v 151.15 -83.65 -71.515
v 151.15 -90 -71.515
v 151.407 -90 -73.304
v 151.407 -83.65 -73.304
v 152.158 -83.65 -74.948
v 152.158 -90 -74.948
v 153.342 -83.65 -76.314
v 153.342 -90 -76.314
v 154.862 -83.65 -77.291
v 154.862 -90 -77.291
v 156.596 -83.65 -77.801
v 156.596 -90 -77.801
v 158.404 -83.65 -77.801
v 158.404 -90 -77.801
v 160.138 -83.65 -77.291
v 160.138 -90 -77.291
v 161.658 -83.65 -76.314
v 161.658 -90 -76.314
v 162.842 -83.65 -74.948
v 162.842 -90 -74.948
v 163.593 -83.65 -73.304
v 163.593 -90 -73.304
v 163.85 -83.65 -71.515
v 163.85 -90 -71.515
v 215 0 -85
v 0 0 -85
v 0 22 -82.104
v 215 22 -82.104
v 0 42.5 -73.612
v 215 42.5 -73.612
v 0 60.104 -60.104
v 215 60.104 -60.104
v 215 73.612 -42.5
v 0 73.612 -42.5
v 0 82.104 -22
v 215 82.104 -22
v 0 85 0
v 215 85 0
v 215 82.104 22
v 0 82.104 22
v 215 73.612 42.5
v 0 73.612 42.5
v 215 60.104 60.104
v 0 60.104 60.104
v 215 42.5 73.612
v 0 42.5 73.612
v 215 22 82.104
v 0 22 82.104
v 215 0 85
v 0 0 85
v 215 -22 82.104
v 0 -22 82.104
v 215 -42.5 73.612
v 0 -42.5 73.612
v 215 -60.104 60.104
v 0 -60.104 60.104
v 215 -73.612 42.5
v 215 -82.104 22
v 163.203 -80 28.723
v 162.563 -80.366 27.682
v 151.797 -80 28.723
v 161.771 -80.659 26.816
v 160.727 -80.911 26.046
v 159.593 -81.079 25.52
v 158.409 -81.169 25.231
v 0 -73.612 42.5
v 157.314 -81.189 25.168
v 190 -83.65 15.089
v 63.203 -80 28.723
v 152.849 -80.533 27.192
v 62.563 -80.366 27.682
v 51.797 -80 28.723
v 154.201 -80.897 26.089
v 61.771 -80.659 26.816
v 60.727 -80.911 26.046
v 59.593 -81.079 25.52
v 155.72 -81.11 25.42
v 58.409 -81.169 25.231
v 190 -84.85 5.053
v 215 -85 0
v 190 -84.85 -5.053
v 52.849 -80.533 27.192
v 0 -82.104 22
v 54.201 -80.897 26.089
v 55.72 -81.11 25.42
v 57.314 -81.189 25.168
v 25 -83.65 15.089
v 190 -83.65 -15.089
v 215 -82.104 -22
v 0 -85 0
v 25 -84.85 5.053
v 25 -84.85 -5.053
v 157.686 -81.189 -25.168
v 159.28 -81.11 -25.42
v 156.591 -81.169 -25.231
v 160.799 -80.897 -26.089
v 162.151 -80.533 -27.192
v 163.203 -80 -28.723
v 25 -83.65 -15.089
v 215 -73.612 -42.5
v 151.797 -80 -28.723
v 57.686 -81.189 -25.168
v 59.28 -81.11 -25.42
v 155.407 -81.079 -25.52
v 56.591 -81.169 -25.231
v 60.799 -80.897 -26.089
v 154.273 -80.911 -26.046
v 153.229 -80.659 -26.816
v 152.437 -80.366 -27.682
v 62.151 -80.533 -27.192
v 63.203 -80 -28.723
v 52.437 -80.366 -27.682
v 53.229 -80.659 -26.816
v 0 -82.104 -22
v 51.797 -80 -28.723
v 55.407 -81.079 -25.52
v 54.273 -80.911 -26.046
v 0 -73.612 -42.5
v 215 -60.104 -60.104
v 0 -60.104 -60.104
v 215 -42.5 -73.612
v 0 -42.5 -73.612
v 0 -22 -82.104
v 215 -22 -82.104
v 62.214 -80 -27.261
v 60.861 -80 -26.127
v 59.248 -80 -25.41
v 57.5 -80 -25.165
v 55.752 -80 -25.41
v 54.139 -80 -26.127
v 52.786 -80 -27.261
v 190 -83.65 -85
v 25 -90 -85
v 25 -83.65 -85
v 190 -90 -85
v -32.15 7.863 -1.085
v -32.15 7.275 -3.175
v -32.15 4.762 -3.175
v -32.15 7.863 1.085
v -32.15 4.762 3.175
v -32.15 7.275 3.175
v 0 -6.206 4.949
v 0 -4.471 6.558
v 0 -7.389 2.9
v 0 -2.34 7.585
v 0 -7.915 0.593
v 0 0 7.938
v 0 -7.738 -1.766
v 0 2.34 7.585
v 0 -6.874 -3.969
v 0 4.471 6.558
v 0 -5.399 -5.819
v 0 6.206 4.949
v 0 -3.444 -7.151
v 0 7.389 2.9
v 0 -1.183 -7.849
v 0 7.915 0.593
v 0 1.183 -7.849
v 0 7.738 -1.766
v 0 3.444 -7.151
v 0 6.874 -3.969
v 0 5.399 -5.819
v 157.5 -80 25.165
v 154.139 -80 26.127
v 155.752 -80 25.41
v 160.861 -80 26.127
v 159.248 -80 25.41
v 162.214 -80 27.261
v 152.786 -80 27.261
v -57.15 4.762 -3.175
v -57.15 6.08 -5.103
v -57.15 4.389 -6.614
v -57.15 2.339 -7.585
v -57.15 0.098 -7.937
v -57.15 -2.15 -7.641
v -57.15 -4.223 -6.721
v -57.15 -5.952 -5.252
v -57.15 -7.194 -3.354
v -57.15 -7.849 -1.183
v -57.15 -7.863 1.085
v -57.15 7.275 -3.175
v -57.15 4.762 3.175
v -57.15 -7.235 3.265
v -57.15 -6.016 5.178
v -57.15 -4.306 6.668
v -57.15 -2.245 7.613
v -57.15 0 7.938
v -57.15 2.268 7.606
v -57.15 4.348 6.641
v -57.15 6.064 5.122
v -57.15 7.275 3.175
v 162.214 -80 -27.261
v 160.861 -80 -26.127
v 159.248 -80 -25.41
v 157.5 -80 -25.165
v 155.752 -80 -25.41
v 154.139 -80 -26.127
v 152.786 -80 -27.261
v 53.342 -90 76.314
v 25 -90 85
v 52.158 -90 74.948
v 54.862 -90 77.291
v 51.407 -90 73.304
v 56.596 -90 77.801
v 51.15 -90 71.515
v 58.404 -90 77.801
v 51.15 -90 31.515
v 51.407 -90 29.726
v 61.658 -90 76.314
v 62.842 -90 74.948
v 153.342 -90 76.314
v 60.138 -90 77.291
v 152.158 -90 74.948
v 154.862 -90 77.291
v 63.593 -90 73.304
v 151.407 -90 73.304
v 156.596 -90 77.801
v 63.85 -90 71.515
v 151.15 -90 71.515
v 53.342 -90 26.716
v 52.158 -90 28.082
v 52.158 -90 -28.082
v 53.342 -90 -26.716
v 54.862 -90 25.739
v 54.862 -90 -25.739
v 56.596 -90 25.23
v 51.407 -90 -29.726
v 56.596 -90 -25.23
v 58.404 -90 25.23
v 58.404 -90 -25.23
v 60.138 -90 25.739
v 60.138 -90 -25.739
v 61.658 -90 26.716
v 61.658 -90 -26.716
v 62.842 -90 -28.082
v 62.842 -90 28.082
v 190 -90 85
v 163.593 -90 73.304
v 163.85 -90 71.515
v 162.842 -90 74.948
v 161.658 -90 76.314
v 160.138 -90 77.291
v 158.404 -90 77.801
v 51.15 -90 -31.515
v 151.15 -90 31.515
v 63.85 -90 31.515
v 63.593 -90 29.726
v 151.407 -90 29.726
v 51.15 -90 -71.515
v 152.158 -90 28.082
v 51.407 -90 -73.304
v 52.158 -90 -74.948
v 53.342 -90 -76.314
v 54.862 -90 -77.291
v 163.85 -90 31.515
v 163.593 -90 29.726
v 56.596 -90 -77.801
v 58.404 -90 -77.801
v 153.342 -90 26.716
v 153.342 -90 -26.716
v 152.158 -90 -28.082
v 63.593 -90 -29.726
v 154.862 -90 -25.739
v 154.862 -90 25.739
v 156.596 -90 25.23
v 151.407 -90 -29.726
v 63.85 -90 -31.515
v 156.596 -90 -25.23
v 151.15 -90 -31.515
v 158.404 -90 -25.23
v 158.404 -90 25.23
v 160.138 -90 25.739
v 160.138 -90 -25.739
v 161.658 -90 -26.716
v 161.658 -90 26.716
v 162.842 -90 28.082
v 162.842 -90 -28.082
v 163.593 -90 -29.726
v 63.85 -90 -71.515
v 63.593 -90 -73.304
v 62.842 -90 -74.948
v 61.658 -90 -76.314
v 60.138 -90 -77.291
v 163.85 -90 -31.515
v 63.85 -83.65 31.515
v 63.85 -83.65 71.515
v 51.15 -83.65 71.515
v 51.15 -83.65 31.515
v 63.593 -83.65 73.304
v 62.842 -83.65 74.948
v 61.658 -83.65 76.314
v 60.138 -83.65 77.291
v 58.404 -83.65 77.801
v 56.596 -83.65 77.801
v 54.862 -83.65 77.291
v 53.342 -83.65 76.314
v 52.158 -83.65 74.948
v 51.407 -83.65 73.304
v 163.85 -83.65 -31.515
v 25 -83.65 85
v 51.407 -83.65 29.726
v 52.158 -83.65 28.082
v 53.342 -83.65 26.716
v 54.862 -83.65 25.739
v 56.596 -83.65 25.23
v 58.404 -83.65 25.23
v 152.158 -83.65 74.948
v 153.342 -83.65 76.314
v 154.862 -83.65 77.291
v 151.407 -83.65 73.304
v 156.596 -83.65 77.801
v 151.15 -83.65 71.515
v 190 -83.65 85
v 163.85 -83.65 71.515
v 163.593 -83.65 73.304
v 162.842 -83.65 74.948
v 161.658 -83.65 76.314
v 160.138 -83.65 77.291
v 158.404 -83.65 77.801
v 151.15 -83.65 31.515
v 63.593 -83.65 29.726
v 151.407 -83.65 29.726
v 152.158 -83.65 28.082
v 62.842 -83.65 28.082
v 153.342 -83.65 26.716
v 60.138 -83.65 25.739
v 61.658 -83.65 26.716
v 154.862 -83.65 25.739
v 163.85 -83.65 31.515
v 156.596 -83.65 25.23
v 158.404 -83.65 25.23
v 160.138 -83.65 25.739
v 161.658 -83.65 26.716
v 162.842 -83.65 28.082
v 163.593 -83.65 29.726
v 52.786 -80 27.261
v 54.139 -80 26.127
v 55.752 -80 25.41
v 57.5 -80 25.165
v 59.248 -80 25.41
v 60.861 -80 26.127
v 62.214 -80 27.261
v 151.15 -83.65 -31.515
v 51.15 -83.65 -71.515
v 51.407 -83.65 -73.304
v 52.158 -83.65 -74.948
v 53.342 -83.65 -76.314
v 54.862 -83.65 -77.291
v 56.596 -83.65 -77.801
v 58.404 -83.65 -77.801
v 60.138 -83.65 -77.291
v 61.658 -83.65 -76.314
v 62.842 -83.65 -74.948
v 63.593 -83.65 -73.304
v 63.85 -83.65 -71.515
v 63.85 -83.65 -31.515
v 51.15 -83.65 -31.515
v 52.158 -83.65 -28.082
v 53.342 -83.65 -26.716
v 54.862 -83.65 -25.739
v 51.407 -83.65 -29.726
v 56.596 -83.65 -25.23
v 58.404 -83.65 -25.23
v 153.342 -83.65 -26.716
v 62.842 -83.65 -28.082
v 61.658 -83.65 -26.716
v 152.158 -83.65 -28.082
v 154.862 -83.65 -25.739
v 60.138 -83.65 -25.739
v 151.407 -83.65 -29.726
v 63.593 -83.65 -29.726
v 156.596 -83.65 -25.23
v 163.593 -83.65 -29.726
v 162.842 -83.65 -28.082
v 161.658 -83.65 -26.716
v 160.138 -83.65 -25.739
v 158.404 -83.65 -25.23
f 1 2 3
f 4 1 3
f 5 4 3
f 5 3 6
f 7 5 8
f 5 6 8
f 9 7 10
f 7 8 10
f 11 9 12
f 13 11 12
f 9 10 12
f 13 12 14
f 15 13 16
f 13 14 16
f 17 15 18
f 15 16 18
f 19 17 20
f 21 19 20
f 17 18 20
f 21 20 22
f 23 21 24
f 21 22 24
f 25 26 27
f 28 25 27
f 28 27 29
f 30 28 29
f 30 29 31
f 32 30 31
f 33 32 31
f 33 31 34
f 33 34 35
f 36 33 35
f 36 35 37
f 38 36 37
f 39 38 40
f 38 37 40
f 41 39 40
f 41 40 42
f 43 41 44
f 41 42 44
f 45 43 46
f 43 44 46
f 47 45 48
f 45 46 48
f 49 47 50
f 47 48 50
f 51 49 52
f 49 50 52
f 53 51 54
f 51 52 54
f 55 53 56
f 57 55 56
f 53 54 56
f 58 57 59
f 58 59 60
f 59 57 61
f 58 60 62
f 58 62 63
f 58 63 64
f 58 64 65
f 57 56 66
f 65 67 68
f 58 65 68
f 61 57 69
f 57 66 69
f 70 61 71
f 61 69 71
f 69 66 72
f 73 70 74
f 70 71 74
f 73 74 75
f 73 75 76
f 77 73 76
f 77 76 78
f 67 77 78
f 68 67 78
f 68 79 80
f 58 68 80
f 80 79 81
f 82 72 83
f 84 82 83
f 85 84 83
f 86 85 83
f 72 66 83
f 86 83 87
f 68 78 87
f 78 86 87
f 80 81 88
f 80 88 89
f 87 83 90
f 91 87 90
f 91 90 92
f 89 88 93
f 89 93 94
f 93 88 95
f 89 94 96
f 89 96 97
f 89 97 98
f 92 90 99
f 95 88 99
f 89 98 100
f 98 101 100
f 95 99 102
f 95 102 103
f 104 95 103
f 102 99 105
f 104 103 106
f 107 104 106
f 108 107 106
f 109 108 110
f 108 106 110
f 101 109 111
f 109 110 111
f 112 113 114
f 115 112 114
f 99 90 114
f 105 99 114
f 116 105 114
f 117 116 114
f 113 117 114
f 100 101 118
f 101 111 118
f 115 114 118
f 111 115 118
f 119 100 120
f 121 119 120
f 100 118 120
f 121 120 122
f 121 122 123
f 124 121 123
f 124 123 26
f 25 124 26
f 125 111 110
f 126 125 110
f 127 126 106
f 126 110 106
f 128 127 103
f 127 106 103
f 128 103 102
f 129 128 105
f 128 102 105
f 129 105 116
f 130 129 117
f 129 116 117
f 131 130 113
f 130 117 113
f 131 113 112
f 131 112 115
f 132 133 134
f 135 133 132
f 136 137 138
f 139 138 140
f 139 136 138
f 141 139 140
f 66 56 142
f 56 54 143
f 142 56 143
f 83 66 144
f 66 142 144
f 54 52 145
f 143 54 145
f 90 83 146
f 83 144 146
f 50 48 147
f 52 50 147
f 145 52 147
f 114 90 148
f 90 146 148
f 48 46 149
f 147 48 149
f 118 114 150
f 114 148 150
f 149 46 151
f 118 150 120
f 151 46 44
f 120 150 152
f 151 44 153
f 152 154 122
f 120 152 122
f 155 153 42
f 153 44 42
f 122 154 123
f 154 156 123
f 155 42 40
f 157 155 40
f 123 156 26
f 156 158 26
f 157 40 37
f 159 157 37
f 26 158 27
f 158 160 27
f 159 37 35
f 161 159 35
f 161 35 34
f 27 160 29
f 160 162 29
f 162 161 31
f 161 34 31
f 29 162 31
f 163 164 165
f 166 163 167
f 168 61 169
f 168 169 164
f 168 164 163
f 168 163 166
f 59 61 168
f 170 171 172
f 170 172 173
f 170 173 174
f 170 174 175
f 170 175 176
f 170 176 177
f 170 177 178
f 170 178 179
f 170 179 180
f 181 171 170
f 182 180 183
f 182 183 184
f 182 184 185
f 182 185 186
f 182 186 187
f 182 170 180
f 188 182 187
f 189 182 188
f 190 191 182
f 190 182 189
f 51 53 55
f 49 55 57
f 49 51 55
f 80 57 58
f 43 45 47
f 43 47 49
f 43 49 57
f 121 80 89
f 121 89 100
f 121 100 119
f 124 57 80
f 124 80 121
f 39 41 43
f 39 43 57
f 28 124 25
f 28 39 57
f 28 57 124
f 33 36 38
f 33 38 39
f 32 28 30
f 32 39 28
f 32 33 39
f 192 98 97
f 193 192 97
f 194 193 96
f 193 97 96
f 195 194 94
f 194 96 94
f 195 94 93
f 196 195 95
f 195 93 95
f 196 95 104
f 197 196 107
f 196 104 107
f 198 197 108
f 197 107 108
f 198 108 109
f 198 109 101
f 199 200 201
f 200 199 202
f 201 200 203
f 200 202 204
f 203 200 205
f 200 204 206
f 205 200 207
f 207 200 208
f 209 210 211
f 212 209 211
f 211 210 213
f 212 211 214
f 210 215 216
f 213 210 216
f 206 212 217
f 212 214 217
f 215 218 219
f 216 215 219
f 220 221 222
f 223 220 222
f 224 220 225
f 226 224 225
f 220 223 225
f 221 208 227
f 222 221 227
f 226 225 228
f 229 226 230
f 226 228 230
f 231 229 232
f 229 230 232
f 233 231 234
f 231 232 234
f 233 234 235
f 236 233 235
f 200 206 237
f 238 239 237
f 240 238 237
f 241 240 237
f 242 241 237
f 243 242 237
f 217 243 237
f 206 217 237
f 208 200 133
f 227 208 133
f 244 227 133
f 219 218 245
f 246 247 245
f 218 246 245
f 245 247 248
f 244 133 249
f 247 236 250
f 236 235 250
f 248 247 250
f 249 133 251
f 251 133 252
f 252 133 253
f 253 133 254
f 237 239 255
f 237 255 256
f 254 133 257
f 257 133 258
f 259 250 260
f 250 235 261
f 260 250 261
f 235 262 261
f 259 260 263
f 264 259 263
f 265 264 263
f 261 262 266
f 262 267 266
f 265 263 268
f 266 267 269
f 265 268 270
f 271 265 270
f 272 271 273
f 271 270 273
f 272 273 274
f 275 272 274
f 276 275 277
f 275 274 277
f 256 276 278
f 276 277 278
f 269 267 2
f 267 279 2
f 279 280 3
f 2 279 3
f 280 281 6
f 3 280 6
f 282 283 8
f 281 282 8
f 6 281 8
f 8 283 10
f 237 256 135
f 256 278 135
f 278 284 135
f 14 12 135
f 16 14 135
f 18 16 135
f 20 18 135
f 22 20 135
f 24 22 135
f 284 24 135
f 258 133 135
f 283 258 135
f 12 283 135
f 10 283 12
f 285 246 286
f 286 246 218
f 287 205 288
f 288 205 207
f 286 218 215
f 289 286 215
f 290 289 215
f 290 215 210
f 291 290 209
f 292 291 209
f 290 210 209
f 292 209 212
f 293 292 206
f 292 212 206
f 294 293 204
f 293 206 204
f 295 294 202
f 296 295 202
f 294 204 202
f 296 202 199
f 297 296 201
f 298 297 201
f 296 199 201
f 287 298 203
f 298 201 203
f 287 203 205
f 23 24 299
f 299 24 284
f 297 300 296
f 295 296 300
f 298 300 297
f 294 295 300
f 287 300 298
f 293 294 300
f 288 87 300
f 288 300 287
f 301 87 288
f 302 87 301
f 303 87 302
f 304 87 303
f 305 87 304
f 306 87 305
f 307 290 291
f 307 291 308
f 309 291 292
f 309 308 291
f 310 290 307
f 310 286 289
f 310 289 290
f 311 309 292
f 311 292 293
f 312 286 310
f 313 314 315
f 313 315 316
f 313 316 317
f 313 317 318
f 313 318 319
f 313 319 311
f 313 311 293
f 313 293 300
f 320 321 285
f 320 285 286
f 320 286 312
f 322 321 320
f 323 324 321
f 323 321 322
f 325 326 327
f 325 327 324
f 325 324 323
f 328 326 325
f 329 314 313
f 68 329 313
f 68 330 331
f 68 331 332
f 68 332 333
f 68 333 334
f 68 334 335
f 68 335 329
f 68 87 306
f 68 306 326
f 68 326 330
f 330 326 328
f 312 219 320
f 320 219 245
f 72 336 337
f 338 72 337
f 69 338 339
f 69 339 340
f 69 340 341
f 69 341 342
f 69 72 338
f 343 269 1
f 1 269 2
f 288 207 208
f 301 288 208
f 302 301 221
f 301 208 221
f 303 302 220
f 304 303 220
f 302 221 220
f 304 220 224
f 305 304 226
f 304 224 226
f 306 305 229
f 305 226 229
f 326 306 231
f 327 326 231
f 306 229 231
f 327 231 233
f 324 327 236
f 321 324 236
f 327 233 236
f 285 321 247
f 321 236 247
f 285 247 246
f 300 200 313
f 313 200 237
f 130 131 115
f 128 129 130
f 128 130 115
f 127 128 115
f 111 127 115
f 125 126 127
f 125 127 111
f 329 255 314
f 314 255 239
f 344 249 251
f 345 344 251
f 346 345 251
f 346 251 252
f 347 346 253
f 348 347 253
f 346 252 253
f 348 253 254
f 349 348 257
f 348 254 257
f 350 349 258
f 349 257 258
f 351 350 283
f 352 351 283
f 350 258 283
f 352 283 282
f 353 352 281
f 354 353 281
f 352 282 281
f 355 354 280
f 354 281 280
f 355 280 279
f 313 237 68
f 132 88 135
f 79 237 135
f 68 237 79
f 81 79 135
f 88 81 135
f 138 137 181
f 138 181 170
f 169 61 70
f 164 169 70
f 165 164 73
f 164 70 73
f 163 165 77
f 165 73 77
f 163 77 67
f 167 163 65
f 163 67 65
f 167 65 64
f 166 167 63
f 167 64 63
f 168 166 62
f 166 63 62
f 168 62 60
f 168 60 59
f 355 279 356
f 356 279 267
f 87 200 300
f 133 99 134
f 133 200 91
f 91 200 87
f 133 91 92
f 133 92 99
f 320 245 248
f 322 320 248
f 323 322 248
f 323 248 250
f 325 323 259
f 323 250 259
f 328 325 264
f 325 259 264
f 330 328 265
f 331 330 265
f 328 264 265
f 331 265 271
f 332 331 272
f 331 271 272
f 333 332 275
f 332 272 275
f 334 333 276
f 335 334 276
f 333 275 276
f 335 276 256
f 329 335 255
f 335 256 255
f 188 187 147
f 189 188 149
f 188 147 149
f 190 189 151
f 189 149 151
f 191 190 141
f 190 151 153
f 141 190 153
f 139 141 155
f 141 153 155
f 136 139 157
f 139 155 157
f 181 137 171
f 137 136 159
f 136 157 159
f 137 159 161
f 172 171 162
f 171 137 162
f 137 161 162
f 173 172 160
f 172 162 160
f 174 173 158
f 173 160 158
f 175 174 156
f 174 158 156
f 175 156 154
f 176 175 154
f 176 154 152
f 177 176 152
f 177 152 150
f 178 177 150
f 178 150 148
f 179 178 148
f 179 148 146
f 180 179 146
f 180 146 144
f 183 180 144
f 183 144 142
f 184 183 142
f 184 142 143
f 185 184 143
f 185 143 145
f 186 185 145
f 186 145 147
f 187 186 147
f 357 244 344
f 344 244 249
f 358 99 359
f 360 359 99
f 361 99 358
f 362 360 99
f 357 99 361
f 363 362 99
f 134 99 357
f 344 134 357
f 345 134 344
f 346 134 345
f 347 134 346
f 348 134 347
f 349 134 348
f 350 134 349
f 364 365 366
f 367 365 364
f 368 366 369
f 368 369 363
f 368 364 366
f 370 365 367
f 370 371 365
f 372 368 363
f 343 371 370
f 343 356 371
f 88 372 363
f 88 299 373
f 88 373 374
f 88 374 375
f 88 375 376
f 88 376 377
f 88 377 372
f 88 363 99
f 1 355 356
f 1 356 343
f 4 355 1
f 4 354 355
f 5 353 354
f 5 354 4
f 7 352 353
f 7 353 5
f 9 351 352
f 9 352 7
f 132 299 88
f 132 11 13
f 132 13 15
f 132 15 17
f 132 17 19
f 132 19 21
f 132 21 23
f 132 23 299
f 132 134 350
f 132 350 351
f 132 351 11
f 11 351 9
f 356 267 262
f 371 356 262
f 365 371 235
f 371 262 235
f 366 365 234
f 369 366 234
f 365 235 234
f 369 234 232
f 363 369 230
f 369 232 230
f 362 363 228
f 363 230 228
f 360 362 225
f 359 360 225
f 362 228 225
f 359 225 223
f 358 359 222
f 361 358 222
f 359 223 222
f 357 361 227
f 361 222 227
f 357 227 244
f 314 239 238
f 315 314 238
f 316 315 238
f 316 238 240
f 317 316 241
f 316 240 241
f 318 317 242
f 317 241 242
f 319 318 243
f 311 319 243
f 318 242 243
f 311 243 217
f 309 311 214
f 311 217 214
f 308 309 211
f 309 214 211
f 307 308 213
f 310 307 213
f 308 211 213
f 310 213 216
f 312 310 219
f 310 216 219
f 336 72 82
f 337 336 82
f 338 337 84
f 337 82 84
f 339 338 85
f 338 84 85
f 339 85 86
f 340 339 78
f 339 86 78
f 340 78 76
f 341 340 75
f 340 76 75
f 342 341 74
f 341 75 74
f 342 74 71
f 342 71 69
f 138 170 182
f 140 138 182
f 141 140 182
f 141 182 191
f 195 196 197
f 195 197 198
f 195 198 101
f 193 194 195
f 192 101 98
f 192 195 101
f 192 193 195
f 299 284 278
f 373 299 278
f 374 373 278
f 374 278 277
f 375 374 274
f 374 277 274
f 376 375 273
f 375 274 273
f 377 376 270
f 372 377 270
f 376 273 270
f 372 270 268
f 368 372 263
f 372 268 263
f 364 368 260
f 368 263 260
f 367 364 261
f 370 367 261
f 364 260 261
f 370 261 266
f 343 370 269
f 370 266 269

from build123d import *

# Parameters (mm, degrees)
CROQUIS1_R              = 85
SALIENTE_EXTRUIR1_DEPTH = 215
CROQUIS2_R              = 7.9375
SALIENTE_EXTRUIR2_DEPTH = 57.15
CROQUIS4_W              = 165
CROQUIS4_H              = 170
SALIENTE_EXTRUIR3_DEPTH = 6.35
CORTAR_EXTRUIR1_DEPTH   = 25
CORTAR_EXTRUIR2_DEPTH   = 10


with BuildPart() as part:
    # Croquis1 → Saliente-Extruir1 (new body)
    with BuildSketch(Plane(origin=(0, 0, 0), x_dir=(0, 0, -1), z_dir=(1, 0, 0))):
        Circle(CROQUIS1_R)
    extrude(amount=SALIENTE_EXTRUIR1_DEPTH)

    # Croquis2 → Saliente-Extruir2 (add)
    with BuildSketch(Plane.ZY):
        Circle(CROQUIS2_R)
    extrude(amount=SALIENTE_EXTRUIR2_DEPTH)

    # Croquis4 → Saliente-Extruir3 (add)
    with BuildSketch(Plane(origin=(0, -90, 0), x_dir=(1, 0, 0), z_dir=(0, 1, 0))):
        with Locations((107.5, 0)):
            Rectangle(CROQUIS4_W, CROQUIS4_H)
    extrude(amount=SALIENTE_EXTRUIR3_DEPTH)

    # Croquis5 → Cortar-Extruir1 (cut)
    with BuildSketch(Plane.ZY.offset(57.15)):
        with BuildLine():
            Line((-3.175, 7.274838916), (-3.175, 4.7625))
            Line((-3.175, 4.7625), (3.175, 4.7625))
            Line((3.175, 4.7625), (3.175, 7.274838916))
            ThreePointArc((3.175, 7.274838916), (0, 7.9375), (-3.175, 7.274838916))
        make_face()
    extrude(amount=-CORTAR_EXTRUIR1_DEPTH, mode=Mode.SUBTRACT)

    # Croquis7 → Cortar-Extruir2 (cut)
    with BuildSketch(Plane.XZ.offset(90)):
        with BuildLine():
            Line((51.15, 71.515151515), (51.15, 31.515151515))
            ThreePointArc((51.15, 31.515151515), (57.5, 25.165151515), (63.85, 31.515151515))
            Line((63.85, 31.515151515), (63.85, 71.515151515))
            ThreePointArc((63.85, 71.515151515), (57.5, 77.865151515), (51.15, 71.515151515))
        make_face()
        with BuildLine():
            Line((151.15, 71.515151515), (151.15, 31.515151515))
            ThreePointArc((151.15, 31.515151515), (157.5, 25.165151515), (163.85, 31.515151515))
            Line((163.85, 31.515151515), (163.85, 71.515151515))
            ThreePointArc((163.85, 71.515151515), (157.5, 77.865151515), (151.15, 71.515151515))
        make_face()
        with BuildLine():
            Line((51.15, -31.515151515), (51.15, -71.515151515))
            ThreePointArc((51.15, -71.515151515), (57.5, -77.865151515), (63.85, -71.515151515))
            Line((63.85, -71.515151515), (63.85, -31.515151515))
            ThreePointArc((63.85, -31.515151515), (57.5, -25.165151515), (51.15, -31.515151515))
        make_face()
        with BuildLine():
            Line((151.15, -31.515151515), (151.15, -71.515151515))
            ThreePointArc((151.15, -71.515151515), (157.5, -77.865151515), (163.85, -71.515151515))
            Line((163.85, -71.515151515), (163.85, -31.515151515))
            ThreePointArc((163.85, -31.515151515), (157.5, -25.165151515), (151.15, -31.515151515))
        make_face()
    extrude(amount=-CORTAR_EXTRUIR2_DEPTH, mode=Mode.SUBTRACT)


solid = part.part
